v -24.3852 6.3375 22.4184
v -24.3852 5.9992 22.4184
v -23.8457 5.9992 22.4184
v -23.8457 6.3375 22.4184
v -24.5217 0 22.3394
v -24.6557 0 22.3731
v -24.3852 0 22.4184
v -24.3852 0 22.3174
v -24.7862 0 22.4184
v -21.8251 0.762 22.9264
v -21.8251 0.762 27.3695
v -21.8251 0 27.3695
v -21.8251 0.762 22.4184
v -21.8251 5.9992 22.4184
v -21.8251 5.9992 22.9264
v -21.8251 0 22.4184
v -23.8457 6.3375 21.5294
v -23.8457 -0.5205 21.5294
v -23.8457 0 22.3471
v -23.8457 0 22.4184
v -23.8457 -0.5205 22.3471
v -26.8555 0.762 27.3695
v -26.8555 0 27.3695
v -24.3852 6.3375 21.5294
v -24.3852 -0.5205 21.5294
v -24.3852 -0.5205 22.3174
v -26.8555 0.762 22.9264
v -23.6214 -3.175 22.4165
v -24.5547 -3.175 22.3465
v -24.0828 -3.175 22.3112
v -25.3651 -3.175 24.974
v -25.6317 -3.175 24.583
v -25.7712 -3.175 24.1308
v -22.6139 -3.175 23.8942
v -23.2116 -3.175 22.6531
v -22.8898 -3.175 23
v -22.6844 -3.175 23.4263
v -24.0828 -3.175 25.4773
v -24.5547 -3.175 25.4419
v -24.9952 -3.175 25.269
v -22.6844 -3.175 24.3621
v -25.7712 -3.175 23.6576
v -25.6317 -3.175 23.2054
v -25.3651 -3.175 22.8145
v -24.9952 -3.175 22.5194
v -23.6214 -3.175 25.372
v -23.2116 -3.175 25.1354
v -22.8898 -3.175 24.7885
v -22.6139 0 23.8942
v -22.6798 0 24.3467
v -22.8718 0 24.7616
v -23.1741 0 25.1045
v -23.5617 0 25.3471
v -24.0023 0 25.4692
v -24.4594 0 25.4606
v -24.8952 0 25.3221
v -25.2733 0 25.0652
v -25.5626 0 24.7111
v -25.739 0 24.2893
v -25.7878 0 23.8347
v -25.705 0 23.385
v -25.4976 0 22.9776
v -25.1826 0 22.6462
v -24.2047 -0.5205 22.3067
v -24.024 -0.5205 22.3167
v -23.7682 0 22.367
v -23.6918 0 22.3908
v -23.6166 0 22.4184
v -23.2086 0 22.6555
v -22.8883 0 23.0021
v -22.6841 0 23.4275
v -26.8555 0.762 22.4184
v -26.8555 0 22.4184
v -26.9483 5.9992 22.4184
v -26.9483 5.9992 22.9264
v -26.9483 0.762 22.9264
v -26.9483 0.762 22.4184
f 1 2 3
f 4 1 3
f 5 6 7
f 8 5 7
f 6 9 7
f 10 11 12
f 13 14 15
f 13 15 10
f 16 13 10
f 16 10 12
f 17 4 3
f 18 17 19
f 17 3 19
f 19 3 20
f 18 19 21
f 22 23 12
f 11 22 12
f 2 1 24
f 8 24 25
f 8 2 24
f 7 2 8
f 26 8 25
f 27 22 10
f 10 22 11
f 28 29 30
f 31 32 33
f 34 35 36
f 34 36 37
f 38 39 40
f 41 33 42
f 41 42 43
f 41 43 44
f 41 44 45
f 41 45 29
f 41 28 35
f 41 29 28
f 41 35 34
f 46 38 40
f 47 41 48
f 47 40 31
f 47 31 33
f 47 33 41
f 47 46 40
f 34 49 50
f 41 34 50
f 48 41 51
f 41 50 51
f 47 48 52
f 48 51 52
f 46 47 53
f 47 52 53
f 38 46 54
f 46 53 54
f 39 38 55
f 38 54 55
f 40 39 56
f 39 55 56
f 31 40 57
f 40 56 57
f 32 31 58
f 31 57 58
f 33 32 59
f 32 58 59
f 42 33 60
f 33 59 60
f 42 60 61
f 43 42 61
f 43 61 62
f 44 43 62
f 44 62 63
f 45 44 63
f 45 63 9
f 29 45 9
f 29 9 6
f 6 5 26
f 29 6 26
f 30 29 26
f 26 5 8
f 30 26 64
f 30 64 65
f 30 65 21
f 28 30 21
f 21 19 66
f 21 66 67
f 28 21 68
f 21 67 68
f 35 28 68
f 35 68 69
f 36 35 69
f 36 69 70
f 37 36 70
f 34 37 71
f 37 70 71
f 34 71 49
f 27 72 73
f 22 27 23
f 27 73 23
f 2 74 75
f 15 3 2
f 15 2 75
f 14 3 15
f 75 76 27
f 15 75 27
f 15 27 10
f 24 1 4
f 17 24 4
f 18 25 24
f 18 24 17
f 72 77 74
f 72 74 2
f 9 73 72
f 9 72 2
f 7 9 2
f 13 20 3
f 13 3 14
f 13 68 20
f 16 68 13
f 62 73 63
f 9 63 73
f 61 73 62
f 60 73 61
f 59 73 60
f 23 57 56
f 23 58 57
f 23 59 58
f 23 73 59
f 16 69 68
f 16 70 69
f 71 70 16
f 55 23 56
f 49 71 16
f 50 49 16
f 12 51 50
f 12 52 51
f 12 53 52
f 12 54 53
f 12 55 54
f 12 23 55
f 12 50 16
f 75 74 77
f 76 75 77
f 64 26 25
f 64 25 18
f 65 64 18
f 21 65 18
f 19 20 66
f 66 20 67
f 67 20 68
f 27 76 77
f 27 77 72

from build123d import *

# Parameters (mm, degrees)
F0_R     = 1.5875
F1_DEPTH = 3.175
F2_W     = 5.0304289907
F2_H     = 4.9511287361
F3_DEPTH = 0.762
F4_W     = 5.1232710698
F4_H     = 5.2371935268
F5_DEPTH = 0.508
F6_W     = 0.5395373363
F6_H     = 6.858
F7_DEPTH = 0.889


with BuildPart() as f1:
    # F0 (on Front) → F1 (new body)
    with BuildSketch(Plane.XZ):
        with Locations((-24.2014154792, 23.8942243159)):
            Circle(F0_R)
    extrude(amount=F1_DEPTH)

    # F2 (on Front) → F3 (join)
    with BuildSketch(Plane.XZ):
        with Locations((-24.3402747437, 24.8939255252)):
            Rectangle(F2_W, F2_H)
    extrude(amount=-F3_DEPTH)

    # F4 (on face) → F5 (join)
    with BuildSketch(Plane(origin=(0, 0, 22.4183611572), x_dir=(1, 0, 0), z_dir=(0, 0, -1))):
        with Locations((-24.3866957833, -3.3805967634)):
            Rectangle(F4_W, F4_H)
    extrude(amount=-F5_DEPTH)

    # F6 (on face) → F7 (join)
    with BuildSketch(Plane(origin=(0, 0, 22.4183611572), x_dir=(1, 0, 0), z_dir=(0, 0, -1))):
        with Locations((-24.1154753933, -2.9085015029)):
            Rectangle(F6_W, F6_H)
    extrude(amount=F7_DEPTH)


solid = f1.part
